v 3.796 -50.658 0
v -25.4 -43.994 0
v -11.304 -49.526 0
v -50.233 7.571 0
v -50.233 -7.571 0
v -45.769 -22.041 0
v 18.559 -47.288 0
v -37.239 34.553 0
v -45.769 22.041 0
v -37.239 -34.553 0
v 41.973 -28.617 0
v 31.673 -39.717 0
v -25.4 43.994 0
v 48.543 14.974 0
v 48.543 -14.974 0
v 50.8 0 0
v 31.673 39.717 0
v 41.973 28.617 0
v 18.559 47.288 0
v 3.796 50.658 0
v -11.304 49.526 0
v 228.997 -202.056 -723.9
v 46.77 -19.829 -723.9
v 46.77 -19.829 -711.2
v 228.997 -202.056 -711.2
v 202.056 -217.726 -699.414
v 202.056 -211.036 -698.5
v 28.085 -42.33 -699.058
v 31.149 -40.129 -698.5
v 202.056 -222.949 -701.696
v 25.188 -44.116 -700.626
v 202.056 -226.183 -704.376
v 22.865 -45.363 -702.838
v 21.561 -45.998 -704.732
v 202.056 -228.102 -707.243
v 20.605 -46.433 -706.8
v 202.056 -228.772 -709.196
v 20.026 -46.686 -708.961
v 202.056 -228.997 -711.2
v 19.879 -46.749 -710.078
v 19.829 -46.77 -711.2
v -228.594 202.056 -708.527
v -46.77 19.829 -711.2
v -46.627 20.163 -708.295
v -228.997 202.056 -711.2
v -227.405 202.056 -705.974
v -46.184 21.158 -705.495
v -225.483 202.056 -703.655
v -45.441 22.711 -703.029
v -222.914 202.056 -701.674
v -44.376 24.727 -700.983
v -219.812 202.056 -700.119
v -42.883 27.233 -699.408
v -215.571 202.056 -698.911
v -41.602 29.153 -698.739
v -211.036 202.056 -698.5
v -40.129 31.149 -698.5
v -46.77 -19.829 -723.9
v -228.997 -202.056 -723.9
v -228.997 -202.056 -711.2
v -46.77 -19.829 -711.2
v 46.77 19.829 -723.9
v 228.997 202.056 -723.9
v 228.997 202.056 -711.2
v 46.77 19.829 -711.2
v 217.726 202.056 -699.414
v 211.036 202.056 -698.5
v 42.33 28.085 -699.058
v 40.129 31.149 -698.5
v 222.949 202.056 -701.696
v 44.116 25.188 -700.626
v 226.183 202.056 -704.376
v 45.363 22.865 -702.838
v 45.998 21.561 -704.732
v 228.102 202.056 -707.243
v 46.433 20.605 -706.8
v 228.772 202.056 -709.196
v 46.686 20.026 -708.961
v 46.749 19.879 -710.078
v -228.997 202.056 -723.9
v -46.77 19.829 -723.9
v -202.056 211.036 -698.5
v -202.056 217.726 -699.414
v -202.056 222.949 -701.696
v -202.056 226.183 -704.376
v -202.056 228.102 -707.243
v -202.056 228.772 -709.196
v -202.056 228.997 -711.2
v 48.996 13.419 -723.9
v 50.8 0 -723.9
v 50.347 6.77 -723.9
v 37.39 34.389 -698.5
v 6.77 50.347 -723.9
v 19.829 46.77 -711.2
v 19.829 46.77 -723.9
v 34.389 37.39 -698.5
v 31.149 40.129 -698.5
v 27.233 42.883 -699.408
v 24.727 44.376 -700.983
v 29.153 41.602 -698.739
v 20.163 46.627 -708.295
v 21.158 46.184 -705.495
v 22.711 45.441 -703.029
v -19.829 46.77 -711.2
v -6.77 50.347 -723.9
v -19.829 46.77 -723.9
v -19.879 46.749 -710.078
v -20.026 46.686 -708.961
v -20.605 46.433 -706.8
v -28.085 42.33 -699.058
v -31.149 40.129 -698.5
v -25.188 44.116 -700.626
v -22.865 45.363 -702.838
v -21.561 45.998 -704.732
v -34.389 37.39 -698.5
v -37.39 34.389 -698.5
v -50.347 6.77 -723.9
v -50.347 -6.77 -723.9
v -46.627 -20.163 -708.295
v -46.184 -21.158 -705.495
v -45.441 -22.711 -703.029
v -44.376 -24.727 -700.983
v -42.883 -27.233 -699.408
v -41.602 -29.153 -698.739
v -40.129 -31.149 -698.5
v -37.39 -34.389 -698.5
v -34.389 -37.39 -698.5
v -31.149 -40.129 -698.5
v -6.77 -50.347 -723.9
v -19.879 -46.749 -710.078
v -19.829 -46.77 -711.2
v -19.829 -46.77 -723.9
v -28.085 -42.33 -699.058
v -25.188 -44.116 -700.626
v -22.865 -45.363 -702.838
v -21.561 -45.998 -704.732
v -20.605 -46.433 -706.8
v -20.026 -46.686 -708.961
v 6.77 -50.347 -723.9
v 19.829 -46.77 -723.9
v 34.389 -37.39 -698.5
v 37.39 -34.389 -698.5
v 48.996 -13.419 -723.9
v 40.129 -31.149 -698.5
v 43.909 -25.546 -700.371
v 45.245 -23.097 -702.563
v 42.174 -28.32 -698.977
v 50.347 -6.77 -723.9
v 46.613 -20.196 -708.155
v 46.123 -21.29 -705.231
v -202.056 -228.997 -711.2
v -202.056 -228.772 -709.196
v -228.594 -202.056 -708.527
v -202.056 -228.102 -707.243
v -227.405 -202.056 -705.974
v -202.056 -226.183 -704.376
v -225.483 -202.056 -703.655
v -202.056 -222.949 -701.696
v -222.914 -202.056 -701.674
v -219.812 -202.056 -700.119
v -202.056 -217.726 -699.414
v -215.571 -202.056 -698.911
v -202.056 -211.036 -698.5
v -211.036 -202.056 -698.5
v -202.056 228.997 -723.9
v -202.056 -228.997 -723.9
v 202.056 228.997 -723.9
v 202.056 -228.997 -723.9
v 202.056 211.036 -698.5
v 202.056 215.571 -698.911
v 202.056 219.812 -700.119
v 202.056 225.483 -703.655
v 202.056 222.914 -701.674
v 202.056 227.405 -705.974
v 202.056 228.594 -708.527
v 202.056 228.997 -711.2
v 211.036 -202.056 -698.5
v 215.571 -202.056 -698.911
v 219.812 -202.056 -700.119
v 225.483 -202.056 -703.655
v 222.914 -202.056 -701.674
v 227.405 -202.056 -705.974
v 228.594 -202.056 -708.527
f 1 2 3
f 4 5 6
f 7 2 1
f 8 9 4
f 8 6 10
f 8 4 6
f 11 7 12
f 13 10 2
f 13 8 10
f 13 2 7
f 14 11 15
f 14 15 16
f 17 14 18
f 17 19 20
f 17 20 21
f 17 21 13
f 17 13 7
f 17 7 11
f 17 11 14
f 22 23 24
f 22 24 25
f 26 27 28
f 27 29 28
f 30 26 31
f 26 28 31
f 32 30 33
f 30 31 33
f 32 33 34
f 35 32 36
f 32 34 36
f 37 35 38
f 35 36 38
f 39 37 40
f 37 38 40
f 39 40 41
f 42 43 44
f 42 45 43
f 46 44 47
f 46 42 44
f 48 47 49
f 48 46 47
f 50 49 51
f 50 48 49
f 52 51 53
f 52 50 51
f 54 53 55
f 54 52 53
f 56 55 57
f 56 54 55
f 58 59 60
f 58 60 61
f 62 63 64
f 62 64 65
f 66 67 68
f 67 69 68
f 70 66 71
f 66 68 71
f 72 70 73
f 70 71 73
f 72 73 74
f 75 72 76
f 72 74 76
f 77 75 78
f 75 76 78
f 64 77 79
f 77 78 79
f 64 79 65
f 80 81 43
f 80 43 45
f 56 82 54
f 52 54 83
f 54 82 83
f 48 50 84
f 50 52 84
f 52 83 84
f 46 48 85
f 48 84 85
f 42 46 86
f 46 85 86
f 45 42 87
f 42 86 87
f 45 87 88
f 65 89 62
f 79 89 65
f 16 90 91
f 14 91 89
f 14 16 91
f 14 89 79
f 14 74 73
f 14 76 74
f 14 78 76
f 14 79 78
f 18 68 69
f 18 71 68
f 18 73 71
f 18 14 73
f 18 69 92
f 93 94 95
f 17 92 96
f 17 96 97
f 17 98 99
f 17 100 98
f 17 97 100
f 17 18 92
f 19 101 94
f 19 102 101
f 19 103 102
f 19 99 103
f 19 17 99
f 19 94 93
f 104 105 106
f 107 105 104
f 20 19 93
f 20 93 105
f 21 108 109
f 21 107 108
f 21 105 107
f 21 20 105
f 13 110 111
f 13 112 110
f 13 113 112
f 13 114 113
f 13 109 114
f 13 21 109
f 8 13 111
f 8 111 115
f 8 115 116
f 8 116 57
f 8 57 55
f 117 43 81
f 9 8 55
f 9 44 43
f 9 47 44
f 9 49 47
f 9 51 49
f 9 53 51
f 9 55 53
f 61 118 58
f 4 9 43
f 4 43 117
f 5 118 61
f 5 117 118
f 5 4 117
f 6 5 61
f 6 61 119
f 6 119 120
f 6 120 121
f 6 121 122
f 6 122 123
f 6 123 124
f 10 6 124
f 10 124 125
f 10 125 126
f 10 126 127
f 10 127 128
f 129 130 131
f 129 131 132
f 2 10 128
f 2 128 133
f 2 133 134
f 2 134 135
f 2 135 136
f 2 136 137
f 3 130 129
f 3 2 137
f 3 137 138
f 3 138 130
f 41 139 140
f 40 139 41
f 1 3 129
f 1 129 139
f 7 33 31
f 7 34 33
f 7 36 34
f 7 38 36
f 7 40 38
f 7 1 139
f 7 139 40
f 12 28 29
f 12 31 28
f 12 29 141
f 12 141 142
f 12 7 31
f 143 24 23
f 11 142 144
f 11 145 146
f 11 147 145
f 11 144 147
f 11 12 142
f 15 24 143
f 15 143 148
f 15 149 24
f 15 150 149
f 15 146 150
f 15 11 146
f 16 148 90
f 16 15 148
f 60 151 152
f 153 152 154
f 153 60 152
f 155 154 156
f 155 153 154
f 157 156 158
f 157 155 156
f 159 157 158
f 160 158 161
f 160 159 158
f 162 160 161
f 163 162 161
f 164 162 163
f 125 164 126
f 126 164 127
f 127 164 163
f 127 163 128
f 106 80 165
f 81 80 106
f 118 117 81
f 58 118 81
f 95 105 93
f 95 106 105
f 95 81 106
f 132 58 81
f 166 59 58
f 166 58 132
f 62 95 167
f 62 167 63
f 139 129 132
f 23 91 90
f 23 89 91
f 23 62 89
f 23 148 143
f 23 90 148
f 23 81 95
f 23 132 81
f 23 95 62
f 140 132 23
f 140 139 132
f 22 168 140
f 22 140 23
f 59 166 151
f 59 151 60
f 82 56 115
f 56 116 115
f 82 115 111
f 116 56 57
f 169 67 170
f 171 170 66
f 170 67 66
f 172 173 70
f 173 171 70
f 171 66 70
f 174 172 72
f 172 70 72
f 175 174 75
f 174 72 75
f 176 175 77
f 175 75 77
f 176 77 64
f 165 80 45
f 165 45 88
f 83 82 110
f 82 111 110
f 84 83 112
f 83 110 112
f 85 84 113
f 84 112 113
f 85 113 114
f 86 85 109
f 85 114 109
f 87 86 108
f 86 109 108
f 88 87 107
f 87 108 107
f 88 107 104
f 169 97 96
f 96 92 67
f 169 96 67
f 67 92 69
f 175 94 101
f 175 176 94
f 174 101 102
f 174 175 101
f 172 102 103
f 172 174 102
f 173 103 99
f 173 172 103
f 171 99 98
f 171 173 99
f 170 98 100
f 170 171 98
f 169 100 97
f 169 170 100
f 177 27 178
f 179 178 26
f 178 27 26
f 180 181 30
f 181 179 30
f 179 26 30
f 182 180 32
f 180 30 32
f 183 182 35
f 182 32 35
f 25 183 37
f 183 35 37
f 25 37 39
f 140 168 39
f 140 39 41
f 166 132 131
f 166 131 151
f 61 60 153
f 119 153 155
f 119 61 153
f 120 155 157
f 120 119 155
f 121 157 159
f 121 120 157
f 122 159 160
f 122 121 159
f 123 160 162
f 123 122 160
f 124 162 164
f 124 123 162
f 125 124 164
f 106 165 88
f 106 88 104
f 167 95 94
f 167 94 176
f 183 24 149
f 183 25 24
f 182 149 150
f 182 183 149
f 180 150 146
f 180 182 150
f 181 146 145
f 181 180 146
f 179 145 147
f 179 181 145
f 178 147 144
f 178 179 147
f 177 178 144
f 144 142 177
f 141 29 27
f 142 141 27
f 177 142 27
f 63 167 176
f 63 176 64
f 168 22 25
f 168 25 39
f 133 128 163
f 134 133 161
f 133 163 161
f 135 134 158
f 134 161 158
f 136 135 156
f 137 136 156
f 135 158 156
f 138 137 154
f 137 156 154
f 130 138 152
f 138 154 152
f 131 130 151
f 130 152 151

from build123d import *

# Parameters (mm, degrees)
F0_R     = 50.8
F1_DEPTH = 723.9
F3_DEPTH = 25.4
F4_R     = 12.7


with BuildPart() as f1:
    # F0 (on Top) → F1 (new body)
    with BuildSketch(Plane.XY):
        Circle(F0_R)
    extrude(amount=-F1_DEPTH)

    # F2 (on face) → F3 (join)
    with BuildSketch(Plane(origin=(0, 0, -723.9), x_dir=(1, 0, 0), z_dir=(0, 0, -1))):
        with BuildLine():
            Line((-228.996531, 202.055763), (-46.770065, 19.829297))
            ThreePointArc((-46.770065, 19.829297), (-35.921024, 35.921024), (-19.829297, 46.770065))
            Line((-19.829297, 46.770065), (-202.055763, 228.996531))
            Line((-202.055763, 228.996531), (-228.996531, 202.055763))
        make_face()
        with BuildLine():
            Line((202.055763, 228.996531), (19.829297, 46.770065))
            ThreePointArc((19.829297, 46.770065), (35.921024, 35.921024), (46.770065, 19.829297))
            Line((46.770065, 19.829297), (228.996531, 202.055763))
            Line((228.996531, 202.055763), (202.055763, 228.996531))
        make_face()
        with BuildLine():
            ThreePointArc((46.770065, -19.829297), (35.921024, -35.921024), (19.829297, -46.770065))
            Line((19.829297, -46.770065), (202.055763, -228.996531))
            Line((202.055763, -228.996531), (228.996531, -202.055763))
            Line((228.996531, -202.055763), (46.770065, -19.829297))
        make_face()
        with BuildLine():
            ThreePointArc((-19.829297, -46.770065), (-35.921024, -35.921024), (-46.770065, -19.829297))
            Line((-46.770065, -19.829297), (-228.996531, -202.055763))
            Line((-228.996531, -202.055763), (-202.055763, -228.996531))
            Line((-202.055763, -228.996531), (-19.829297, -46.770065))
        make_face()
    extrude(amount=-F3_DEPTH)

    # F4
    f4_edges = [f1.edges().sort_by_distance(p)[0] for p in [
        (-110.94253, -137.883298, -698.5),
        (-215.526147, -215.526147, -698.5),
        (-137.883298, -110.94253, -698.5),
        (-137.883298, 110.94253, -698.5),
        (-215.526147, 215.526147, -698.5),
        (-110.94253, 137.883298, -698.5),
        (110.94253, 137.883298, -698.5),
        (137.883298, 110.94253, -698.5),
        (215.526147, 215.526147, -698.5),
        (137.883298, -110.94253, -698.5),
        (110.94253, -137.883298, -698.5),
        (215.526147, -215.526147, -698.5),
    ]]
    fillet(f4_edges, radius=F4_R)


with BuildPart() as f5_1:
    # F5: copy of F1
    add(f1.part)


solid = f1.part
